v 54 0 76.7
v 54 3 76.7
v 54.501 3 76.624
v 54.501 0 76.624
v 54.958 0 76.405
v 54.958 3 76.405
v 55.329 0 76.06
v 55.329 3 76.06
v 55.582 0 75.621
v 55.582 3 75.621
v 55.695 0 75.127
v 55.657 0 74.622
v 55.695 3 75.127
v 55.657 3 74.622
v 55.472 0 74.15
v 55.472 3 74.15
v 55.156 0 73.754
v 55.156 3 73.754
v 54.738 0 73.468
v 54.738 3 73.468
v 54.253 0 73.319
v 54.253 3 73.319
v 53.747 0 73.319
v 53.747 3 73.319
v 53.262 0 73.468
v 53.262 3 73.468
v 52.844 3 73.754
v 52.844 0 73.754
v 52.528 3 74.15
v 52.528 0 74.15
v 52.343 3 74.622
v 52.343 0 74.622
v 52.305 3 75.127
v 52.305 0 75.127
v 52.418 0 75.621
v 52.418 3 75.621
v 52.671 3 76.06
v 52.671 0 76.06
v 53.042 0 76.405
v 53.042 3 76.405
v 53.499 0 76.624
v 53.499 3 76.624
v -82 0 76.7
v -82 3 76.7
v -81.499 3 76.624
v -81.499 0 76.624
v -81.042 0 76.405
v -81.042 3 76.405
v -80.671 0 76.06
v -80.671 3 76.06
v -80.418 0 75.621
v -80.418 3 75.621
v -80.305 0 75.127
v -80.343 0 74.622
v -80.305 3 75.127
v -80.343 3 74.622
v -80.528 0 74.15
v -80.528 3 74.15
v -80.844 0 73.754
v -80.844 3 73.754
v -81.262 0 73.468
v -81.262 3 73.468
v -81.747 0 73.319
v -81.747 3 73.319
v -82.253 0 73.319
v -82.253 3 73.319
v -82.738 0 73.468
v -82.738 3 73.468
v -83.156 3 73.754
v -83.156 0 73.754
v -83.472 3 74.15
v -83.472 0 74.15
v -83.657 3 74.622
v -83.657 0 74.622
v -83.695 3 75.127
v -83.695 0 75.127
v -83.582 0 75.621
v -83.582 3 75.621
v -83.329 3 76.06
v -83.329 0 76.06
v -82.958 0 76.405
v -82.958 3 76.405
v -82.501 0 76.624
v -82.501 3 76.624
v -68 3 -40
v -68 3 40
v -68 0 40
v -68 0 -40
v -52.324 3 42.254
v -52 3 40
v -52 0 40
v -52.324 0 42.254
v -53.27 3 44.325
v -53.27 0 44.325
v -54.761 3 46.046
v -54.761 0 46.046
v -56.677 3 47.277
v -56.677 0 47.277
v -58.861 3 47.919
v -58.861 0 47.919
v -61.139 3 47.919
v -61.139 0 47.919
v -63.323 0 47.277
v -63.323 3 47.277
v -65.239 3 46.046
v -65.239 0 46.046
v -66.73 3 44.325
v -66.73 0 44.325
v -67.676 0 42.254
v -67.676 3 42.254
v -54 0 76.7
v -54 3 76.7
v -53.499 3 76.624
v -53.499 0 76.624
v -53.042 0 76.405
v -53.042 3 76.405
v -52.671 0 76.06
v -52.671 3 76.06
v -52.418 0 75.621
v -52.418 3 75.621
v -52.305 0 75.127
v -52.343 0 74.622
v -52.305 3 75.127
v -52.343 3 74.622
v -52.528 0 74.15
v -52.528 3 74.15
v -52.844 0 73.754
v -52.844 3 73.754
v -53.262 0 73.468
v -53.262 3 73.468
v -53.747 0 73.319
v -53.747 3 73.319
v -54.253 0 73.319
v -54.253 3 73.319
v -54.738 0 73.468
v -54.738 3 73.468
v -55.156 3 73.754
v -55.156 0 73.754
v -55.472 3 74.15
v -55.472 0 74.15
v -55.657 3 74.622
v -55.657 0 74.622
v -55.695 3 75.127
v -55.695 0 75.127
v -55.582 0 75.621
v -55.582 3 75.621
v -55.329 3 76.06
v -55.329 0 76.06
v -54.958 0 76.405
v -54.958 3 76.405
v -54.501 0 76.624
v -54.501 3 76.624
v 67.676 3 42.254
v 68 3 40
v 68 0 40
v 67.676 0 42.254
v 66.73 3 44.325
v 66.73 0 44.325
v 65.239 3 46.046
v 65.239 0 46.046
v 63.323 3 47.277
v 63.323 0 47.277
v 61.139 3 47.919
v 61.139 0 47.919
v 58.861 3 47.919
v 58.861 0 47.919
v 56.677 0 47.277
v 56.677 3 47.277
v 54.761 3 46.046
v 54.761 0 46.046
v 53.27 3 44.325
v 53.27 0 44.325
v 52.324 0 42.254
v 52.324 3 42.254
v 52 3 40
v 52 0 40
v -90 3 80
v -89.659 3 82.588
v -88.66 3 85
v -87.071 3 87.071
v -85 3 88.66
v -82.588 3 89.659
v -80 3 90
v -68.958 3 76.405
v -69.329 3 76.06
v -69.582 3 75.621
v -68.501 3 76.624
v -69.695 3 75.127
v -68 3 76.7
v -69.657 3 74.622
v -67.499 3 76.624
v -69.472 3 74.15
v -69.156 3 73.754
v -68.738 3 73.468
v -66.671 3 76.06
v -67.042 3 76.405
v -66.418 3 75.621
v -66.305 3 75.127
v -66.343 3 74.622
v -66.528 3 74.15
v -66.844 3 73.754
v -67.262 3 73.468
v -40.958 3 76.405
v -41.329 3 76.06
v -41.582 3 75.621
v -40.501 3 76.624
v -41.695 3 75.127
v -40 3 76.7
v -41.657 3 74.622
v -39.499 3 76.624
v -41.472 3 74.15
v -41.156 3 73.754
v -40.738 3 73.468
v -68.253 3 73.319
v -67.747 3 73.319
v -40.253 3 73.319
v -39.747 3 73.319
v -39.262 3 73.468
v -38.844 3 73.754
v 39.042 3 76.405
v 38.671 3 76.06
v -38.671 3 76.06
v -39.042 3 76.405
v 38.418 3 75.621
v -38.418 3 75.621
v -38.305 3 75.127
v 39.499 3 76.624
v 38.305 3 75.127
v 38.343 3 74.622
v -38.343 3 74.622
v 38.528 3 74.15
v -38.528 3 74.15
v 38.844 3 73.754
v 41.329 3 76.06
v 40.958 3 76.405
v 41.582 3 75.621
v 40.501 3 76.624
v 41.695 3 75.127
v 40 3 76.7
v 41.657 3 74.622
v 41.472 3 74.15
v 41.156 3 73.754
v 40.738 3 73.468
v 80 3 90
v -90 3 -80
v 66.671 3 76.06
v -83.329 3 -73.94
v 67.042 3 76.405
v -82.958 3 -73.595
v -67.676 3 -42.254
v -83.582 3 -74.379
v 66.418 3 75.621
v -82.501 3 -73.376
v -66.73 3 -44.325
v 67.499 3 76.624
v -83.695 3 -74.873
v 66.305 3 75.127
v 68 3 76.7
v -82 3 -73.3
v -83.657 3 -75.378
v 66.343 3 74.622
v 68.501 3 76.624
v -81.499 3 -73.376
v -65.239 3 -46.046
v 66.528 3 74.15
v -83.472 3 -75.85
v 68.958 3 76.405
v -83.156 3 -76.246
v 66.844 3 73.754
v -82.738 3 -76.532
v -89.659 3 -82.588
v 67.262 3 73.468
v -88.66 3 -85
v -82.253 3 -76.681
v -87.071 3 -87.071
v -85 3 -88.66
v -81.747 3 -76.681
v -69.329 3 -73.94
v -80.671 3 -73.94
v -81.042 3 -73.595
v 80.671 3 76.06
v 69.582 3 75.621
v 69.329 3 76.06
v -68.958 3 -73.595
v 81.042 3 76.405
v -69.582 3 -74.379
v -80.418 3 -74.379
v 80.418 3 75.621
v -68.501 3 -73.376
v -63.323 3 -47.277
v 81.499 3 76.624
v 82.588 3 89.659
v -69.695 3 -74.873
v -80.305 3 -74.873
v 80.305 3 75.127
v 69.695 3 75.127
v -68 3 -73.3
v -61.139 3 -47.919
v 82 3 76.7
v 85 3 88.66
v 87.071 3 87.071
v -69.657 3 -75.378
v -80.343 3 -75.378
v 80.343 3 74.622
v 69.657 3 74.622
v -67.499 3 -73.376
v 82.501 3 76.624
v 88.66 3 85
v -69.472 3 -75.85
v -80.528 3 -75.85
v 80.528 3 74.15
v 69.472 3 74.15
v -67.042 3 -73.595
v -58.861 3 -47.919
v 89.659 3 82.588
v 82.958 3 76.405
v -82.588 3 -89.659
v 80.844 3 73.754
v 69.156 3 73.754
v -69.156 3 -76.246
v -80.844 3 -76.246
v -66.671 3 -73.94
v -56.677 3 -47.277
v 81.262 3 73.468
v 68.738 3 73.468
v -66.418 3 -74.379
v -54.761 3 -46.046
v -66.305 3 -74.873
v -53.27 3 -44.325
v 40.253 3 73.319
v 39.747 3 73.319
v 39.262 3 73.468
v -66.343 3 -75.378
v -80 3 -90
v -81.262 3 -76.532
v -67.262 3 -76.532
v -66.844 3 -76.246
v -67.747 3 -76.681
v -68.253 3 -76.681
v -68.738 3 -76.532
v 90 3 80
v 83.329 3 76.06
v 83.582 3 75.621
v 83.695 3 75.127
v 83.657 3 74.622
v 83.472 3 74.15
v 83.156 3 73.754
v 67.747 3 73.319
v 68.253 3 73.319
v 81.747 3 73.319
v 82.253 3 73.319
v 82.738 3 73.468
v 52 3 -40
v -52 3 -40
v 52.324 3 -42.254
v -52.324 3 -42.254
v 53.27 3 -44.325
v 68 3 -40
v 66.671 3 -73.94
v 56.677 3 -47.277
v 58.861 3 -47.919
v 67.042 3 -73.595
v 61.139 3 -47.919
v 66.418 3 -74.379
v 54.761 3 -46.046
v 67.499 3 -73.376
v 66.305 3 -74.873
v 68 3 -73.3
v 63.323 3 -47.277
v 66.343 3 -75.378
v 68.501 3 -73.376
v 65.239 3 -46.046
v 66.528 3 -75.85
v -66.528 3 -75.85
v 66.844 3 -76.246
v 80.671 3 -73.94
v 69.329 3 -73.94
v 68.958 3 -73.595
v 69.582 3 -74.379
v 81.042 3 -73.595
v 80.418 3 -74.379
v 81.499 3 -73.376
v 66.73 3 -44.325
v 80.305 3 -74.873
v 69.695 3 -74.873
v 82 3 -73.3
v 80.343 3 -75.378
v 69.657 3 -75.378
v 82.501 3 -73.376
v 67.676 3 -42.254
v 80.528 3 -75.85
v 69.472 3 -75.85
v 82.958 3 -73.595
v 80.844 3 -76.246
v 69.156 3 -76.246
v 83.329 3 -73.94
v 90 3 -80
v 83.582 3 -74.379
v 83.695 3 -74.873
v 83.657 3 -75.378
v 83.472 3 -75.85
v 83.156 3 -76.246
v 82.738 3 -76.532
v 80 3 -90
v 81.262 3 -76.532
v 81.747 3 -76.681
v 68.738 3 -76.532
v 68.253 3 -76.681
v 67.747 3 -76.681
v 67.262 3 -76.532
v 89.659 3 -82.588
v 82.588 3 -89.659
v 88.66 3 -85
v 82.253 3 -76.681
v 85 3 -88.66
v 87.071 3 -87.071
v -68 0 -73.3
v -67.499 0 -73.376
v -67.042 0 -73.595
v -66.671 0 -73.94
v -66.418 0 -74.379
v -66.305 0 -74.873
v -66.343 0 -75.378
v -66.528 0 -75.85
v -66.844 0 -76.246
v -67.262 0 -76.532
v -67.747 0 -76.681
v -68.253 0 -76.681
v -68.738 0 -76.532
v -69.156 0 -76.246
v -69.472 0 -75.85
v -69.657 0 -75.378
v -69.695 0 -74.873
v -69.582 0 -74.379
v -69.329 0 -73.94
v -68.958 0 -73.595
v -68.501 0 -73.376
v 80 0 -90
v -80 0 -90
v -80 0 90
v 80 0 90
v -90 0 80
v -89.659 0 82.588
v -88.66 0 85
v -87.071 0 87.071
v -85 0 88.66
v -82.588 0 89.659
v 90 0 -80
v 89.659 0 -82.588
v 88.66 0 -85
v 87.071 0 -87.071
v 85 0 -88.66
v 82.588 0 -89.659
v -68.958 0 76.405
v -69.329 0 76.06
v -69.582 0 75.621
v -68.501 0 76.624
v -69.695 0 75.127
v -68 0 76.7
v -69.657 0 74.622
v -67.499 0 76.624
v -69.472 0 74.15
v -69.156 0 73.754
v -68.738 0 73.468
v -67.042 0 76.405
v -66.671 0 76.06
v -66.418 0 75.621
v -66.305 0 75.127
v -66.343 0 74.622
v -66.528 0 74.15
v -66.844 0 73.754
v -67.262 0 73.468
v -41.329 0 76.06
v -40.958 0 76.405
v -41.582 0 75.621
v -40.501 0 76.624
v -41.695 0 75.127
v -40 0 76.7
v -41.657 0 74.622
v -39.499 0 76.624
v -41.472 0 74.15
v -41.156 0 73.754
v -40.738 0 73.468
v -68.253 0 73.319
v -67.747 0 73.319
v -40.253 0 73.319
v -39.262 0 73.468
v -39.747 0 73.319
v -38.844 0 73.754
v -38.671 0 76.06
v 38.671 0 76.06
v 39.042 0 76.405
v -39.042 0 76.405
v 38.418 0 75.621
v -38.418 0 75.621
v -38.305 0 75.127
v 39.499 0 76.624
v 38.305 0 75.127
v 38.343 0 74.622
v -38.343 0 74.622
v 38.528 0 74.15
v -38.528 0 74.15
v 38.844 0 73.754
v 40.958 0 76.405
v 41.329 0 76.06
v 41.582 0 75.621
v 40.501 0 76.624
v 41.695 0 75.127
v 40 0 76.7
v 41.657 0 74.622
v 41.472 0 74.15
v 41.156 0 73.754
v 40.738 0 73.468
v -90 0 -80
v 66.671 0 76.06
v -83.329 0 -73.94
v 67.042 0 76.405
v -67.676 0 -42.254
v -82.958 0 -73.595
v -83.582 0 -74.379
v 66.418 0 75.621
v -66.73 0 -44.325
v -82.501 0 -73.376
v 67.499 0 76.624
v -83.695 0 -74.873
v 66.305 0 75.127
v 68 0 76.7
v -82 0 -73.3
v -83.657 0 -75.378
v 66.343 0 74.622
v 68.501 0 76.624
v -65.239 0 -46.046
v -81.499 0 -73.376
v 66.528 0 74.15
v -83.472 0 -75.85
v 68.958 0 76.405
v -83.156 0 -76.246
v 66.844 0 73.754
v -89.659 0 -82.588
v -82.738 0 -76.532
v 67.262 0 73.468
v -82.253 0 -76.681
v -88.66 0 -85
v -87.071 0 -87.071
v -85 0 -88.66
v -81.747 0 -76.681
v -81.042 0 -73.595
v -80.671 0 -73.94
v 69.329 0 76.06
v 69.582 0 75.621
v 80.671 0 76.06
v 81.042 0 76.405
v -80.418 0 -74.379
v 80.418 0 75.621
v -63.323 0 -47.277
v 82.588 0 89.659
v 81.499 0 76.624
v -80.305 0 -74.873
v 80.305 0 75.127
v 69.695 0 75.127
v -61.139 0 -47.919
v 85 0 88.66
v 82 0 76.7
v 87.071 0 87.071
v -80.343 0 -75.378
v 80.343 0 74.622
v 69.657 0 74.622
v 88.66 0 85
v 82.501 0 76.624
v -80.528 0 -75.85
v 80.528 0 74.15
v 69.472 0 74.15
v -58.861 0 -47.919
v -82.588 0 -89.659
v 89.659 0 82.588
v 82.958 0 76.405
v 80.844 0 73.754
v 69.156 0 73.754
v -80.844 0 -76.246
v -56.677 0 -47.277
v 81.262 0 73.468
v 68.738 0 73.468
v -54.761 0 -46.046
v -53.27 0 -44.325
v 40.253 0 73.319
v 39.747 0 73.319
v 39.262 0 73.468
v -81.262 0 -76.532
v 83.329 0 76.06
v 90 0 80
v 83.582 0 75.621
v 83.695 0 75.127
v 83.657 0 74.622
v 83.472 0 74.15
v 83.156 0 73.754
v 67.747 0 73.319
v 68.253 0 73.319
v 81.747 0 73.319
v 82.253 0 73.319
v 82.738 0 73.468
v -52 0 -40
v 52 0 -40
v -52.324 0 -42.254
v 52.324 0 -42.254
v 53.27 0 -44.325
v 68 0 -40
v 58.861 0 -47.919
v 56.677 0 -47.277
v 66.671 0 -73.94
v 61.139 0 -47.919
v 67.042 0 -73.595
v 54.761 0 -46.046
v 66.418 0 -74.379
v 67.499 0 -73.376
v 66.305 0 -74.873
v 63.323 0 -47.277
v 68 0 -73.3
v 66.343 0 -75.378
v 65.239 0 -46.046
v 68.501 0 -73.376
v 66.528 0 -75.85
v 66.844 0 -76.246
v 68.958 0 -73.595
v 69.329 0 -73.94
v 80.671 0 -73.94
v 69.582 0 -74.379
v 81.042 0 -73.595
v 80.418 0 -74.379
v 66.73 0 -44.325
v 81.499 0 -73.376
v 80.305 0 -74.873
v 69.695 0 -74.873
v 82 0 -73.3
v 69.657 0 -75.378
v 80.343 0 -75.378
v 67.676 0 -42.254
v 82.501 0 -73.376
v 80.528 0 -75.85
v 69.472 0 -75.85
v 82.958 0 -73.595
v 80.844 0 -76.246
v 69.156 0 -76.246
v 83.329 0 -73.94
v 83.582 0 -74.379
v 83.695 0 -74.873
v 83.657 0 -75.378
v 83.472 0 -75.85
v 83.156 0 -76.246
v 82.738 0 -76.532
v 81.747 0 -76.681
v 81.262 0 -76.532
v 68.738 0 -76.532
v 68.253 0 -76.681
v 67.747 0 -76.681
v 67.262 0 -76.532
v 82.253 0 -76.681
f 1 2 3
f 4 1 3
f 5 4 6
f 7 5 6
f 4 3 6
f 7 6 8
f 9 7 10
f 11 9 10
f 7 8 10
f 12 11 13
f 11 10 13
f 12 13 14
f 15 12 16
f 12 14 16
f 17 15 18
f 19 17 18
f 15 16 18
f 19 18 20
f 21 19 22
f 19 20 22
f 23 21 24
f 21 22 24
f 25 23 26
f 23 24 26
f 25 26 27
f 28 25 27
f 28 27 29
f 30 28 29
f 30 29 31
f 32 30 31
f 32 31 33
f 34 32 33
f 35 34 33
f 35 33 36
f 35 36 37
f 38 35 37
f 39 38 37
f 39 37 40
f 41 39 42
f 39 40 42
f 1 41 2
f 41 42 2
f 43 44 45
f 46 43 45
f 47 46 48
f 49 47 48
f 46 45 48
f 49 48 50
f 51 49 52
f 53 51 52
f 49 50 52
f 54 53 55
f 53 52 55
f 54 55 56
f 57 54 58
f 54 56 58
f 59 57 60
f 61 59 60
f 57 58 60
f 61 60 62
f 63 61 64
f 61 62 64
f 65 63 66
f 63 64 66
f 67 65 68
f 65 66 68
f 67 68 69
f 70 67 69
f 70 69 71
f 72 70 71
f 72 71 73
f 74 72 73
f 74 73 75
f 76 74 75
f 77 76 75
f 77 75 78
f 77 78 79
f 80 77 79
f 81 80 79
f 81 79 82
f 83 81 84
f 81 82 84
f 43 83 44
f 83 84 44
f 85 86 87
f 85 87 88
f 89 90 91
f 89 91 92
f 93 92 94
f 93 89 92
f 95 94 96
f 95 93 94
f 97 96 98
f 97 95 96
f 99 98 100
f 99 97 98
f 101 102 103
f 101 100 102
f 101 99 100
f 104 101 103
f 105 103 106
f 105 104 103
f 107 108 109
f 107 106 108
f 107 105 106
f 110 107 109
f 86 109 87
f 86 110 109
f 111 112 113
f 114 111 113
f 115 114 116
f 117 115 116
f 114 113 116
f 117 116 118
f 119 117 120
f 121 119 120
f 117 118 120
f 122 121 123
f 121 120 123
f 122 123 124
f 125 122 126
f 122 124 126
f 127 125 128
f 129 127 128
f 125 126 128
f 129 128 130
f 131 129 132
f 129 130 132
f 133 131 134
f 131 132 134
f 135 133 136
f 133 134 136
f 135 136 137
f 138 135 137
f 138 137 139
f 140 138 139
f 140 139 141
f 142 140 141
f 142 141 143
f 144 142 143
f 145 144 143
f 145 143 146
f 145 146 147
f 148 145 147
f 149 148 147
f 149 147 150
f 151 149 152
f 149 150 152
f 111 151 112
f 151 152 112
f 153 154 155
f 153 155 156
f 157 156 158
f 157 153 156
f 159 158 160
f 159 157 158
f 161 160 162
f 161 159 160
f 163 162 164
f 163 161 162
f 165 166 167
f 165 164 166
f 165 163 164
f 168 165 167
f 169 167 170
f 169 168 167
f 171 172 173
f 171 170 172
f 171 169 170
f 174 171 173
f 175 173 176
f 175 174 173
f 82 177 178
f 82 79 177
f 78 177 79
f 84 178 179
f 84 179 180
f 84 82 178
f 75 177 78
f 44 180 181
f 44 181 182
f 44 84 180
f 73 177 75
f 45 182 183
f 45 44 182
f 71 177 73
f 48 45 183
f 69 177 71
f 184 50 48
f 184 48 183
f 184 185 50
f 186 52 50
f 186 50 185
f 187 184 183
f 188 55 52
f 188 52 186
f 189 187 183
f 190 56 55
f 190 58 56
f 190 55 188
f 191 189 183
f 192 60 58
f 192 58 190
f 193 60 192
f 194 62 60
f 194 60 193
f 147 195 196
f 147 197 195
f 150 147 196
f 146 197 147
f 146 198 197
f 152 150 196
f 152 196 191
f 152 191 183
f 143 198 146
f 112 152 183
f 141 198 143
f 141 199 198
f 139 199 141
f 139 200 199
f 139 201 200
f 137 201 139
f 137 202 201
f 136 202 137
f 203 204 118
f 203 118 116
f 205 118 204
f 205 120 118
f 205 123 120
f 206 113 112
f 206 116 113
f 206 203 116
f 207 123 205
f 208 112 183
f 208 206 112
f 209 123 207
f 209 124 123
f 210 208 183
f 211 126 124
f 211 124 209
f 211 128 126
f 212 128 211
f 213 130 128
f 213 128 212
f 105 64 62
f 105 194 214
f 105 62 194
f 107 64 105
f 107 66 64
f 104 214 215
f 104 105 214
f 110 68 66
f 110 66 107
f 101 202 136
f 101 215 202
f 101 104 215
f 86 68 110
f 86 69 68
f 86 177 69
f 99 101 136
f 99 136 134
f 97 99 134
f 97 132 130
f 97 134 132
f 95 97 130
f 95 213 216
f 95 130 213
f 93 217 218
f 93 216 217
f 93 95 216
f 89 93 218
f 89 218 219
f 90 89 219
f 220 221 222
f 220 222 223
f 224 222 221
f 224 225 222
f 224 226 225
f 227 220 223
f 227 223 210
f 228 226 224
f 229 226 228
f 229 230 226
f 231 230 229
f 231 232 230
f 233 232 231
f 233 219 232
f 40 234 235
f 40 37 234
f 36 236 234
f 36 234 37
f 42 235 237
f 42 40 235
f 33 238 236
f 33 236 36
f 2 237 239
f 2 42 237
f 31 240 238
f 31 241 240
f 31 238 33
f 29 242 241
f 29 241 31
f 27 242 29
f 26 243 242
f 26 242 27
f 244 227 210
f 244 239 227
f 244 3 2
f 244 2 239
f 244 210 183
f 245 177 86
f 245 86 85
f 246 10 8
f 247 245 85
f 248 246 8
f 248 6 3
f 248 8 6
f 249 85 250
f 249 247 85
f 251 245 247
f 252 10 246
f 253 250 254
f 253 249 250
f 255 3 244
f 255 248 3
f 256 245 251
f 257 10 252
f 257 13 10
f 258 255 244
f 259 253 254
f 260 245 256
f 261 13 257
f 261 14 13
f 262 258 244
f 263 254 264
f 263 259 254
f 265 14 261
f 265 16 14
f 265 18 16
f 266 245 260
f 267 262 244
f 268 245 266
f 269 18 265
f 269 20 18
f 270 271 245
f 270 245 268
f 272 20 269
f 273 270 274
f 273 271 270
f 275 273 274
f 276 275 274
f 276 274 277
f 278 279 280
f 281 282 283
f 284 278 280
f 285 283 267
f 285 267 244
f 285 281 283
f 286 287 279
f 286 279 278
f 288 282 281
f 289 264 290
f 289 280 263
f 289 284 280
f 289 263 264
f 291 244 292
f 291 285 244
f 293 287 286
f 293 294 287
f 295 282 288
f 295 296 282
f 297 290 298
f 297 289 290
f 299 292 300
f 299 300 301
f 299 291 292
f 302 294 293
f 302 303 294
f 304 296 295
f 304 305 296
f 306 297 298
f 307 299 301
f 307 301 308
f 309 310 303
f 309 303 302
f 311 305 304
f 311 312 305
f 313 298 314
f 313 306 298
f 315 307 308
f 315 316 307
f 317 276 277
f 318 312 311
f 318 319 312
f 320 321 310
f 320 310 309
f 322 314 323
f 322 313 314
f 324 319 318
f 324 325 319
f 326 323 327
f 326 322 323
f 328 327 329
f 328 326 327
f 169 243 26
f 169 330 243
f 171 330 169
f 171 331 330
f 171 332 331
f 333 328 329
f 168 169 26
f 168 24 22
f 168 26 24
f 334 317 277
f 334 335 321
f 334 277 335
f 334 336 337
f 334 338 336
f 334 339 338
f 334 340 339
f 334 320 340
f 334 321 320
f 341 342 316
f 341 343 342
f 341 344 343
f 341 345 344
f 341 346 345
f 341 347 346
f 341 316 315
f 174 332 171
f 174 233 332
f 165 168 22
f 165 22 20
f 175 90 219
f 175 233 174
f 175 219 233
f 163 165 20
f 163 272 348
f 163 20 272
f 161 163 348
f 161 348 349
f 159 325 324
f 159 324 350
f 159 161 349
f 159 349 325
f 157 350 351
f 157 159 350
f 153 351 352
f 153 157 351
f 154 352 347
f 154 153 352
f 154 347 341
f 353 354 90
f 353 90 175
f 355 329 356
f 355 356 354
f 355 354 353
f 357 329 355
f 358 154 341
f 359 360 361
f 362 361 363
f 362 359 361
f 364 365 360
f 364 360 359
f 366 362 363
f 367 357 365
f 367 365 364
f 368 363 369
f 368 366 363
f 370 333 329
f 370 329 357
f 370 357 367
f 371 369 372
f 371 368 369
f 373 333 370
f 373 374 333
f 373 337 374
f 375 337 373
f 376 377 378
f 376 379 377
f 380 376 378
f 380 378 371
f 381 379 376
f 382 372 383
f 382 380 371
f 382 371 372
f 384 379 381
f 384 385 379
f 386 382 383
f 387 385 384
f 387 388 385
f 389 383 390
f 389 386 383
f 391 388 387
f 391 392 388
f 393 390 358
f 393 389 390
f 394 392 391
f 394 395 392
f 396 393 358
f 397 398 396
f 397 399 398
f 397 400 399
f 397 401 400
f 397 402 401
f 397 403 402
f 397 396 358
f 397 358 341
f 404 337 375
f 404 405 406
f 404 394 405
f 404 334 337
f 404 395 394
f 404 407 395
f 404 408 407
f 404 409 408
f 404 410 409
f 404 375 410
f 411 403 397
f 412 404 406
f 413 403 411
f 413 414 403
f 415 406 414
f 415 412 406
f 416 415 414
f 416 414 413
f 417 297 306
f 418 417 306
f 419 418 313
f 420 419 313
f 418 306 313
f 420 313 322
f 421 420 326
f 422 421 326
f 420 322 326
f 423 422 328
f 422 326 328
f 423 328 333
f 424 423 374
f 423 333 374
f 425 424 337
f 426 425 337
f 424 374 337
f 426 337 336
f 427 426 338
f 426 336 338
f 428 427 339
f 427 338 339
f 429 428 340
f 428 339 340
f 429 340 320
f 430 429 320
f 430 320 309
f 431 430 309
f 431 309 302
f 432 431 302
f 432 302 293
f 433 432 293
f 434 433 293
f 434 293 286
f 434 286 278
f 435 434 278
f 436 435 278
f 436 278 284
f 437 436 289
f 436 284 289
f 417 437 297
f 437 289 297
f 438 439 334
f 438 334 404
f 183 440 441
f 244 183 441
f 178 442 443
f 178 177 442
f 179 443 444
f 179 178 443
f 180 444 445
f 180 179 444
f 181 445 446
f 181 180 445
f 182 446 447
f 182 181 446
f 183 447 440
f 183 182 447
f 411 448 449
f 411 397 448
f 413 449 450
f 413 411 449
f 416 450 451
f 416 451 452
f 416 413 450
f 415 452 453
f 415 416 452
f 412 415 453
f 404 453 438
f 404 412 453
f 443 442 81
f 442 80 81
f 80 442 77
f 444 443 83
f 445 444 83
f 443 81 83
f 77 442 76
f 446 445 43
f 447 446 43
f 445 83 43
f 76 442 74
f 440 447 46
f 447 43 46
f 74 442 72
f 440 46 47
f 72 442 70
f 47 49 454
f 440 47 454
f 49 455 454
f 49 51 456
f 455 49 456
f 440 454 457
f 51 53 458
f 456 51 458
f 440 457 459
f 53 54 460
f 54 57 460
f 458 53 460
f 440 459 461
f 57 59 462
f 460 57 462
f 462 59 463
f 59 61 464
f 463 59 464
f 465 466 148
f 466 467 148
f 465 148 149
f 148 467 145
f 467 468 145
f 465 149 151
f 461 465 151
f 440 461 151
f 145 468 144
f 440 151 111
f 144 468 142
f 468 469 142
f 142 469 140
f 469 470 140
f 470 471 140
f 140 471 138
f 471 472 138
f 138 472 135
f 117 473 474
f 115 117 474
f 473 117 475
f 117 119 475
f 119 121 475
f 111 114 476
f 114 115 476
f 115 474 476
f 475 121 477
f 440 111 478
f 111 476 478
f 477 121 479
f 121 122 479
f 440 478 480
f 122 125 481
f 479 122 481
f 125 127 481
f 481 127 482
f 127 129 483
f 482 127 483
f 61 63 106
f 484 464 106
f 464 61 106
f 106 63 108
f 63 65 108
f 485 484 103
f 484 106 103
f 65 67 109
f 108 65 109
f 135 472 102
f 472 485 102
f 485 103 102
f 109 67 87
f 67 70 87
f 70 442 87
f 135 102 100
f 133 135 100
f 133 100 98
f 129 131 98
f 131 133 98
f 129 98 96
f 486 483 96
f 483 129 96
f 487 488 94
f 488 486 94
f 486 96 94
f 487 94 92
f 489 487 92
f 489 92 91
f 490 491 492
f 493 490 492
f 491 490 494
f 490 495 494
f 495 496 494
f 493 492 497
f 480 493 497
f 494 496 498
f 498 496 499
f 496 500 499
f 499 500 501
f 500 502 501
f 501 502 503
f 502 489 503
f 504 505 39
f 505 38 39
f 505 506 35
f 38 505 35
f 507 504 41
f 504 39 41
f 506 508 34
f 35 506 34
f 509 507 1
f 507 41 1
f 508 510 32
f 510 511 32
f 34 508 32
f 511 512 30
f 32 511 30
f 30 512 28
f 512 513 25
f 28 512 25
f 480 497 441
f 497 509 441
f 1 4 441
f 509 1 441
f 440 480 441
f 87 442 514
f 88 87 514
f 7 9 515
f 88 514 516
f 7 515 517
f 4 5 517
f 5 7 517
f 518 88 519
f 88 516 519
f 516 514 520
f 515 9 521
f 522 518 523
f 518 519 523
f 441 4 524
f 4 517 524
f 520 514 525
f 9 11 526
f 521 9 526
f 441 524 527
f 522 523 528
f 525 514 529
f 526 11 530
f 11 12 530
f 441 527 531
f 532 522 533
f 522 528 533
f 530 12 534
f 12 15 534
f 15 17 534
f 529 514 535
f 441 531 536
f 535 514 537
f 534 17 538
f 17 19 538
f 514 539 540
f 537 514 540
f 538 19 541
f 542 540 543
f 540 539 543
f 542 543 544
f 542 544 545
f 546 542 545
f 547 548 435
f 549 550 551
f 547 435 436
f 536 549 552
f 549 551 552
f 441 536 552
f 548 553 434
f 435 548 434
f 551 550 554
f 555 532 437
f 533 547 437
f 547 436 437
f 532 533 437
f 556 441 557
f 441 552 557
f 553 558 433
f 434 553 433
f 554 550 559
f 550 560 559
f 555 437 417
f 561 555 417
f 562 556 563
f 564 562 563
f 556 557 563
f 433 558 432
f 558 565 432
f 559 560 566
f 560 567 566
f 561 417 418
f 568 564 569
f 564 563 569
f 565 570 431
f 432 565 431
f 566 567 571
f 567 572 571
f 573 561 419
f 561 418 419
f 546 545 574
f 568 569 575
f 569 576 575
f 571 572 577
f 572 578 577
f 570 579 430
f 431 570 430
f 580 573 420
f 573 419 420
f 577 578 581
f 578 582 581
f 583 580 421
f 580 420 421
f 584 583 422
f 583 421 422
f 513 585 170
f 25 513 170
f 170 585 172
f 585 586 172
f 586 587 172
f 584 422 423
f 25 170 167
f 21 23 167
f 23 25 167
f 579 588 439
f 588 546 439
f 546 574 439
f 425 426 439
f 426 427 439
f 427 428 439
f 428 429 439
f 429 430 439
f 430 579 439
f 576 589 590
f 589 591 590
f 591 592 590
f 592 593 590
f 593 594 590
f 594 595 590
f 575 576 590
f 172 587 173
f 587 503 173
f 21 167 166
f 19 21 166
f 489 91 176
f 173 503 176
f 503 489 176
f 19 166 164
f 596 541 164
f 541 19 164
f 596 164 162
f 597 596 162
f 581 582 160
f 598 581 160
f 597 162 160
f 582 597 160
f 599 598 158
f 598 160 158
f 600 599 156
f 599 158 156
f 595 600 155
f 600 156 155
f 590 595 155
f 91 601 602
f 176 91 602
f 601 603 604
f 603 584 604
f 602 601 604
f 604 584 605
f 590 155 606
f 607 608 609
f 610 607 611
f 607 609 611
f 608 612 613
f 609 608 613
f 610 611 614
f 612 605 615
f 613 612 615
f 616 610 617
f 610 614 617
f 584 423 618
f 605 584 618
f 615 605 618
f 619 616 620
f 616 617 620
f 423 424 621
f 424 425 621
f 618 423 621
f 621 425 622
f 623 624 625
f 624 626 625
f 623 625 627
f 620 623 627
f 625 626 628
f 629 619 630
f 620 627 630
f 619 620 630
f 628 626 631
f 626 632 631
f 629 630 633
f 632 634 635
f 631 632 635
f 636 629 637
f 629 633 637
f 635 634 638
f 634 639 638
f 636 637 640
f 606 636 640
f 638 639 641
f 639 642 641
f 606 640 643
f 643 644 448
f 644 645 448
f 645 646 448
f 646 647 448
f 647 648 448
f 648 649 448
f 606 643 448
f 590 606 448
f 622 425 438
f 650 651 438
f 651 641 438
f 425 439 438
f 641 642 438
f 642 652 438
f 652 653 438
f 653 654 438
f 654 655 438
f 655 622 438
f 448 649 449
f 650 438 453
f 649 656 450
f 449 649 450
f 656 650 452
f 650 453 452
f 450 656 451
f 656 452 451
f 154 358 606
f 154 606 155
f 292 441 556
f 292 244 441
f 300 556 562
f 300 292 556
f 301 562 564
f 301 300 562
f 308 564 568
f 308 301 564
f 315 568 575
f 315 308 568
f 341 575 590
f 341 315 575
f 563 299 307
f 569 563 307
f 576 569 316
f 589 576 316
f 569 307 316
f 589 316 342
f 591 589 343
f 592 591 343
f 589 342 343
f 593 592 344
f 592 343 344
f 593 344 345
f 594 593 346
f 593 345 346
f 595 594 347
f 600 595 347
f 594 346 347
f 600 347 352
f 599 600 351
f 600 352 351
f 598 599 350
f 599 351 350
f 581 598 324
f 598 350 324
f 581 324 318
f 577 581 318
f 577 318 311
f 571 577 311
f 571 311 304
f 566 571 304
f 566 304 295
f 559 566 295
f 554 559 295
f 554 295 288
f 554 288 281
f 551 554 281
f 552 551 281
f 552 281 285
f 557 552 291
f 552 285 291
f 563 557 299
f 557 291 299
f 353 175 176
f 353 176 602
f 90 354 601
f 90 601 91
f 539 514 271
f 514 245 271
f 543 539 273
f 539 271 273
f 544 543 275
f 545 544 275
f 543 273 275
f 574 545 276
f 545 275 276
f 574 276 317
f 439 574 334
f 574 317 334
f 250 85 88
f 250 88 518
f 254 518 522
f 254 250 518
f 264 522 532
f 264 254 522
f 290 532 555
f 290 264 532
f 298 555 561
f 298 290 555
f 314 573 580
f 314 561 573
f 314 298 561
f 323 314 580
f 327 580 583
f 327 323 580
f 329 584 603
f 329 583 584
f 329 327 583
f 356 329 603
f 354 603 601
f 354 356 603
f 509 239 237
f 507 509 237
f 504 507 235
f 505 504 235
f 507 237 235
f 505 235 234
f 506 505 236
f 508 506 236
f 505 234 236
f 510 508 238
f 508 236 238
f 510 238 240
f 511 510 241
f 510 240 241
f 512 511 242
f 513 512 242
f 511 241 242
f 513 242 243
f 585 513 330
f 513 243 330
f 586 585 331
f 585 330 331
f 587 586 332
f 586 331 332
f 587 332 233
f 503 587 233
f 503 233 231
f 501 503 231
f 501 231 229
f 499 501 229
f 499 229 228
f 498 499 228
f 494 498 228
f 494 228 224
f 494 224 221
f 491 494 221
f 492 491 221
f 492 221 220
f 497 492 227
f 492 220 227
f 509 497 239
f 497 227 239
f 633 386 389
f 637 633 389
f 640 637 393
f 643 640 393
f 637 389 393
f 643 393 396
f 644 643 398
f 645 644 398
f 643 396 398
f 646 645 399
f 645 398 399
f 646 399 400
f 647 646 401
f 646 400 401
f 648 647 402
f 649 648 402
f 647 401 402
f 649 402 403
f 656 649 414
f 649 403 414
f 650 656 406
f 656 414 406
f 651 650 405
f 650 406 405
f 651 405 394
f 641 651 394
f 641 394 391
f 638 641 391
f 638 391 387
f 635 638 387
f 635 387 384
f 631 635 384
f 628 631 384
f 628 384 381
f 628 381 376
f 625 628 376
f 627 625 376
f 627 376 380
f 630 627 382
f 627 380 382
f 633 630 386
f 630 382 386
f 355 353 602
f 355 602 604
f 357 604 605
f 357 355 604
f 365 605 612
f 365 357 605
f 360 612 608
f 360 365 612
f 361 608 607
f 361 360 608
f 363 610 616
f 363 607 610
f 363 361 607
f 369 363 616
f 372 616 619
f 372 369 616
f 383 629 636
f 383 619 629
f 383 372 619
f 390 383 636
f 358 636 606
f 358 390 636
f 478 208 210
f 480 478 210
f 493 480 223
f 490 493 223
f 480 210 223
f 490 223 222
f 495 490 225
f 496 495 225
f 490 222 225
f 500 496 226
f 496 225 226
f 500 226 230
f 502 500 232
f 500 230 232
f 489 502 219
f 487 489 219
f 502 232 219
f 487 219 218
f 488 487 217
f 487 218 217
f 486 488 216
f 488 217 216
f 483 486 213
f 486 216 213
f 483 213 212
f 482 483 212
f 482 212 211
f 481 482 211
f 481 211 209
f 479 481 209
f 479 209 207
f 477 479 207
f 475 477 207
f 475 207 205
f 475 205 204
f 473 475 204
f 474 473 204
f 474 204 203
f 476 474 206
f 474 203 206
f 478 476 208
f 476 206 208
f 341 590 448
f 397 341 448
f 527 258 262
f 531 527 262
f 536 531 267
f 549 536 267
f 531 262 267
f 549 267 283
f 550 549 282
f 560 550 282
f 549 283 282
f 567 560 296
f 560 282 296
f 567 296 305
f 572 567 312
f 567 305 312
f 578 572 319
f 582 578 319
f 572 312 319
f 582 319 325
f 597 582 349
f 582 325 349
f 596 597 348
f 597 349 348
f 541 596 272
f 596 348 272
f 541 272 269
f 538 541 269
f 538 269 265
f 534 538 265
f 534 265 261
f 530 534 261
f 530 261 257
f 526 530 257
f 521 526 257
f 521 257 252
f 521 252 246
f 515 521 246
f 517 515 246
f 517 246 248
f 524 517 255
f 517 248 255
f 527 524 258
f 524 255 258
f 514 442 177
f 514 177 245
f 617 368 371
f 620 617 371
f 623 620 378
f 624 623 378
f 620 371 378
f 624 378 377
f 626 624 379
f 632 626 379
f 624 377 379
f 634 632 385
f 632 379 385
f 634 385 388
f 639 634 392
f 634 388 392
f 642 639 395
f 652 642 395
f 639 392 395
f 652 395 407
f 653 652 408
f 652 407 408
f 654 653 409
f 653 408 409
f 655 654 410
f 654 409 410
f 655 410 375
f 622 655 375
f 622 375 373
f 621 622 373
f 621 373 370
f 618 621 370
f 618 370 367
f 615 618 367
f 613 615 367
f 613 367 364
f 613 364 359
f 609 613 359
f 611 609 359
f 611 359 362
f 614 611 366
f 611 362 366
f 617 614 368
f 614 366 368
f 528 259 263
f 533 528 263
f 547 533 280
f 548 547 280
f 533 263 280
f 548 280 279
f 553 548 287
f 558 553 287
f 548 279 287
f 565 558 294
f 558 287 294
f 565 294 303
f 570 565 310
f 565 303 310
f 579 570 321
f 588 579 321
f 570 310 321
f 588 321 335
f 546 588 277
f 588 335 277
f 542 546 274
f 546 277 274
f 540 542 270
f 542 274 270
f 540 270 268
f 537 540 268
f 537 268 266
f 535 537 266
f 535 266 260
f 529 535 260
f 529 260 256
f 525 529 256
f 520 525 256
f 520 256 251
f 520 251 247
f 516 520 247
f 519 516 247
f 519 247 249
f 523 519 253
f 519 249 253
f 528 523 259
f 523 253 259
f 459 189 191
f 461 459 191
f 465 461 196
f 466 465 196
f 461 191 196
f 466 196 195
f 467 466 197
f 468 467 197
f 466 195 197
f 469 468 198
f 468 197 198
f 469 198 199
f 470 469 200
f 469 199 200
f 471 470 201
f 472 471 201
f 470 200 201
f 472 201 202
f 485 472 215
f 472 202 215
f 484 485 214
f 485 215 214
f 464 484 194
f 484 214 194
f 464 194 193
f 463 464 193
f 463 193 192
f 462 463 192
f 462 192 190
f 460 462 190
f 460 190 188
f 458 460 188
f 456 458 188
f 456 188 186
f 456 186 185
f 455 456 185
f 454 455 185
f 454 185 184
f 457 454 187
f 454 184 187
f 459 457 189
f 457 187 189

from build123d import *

# Parameters (mm, degrees)
SKETCH1_W           = 180
SKETCH1_H           = 180
BOSS_EXTRUDE1_DEPTH = 3
FILLET1_R           = 10
SKETCH2_R           = 1.7
CUT_EXTRUDE1_DEPTH  = 3
CUT_EXTRUDE2_DEPTH  = 128.314571044


with BuildPart() as part:
    # Sketch1 → Boss-Extrude1 (new body)
    with BuildSketch(Plane(origin=(0, 0, 0), x_dir=(1, 0, 0), z_dir=(0, 1, 0))):
        Rectangle(SKETCH1_W, SKETCH1_H)
    extrude(amount=BOSS_EXTRUDE1_DEPTH)

    # Fillet1
    fillet1_edges = [part.edges().sort_by_distance(p)[0] for p in [
        (90, 1.5, 90),
        (-90, 1.5, 90),
        (-90, 1.5, -90),
        (90, 1.5, -90),
    ]]
    fillet(fillet1_edges, radius=FILLET1_R)

    # Sketch2 → Cut-Extrude1 (cut)
    with BuildSketch(Plane(origin=(0, 3, 0), x_dir=(1, 0, 0), z_dir=(0, 1, 0))):
        with Locations(Location((-82, 75, 0), (0, 0, 270))):
            Circle(SKETCH2_R)
        with Locations(Location((-68, 75, 0), (0, 0, 270))):
            Circle(SKETCH2_R)
        with Locations(Location((68, 75, 0), (0, 0, 270))):
            Circle(SKETCH2_R)
        with Locations(Location((82, 75, 0), (0, 0, 270))):
            Circle(SKETCH2_R)
        with Locations(Location((-82, -75, 0), (0, 0, 270))):
            Circle(SKETCH2_R)
        with Locations(Location((-68, -75, 0), (0, 0, 270))):
            Circle(SKETCH2_R)
        with Locations(Location((68, -75, 0), (0, 0, 270))):
            Circle(SKETCH2_R)
        with Locations(Location((82, -75, 0), (0, 0, 270))):
            Circle(SKETCH2_R)
        with Locations(Location((-54, -75, 0), (0, 0, 270))):
            Circle(SKETCH2_R)
        with Locations(Location((54, -75, 0), (0, 0, 270))):
            Circle(SKETCH2_R)
        with Locations(Location((-40, -75, 0), (0, 0, 270))):
            Circle(SKETCH2_R)
        with Locations(Location((40, -75, 0), (0, 0, 270))):
            Circle(SKETCH2_R)
    extrude(amount=-CUT_EXTRUDE1_DEPTH, mode=Mode.SUBTRACT)

    # Sketch3 → Cut-Extrude2 (cut, through all)
    with BuildSketch(Plane(origin=(0, 3, 0), x_dir=(1, 0, 0), z_dir=(0, 1, 0))):
        with BuildLine():
            Line((-52, 40), (-52, -40))
            ThreePointArc((-52, -40), (-60, -48), (-68, -40))
            Line((-68, -40), (-68, 40))
            ThreePointArc((-68, 40), (-60, 48), (-52, 40))
        make_face()
        with BuildLine():
            Line((68, 40), (68, -40))
            ThreePointArc((68, -40), (60, -48), (52, -40))
            Line((52, -40), (52, 40))
            ThreePointArc((52, 40), (60, 48), (68, 40))
        make_face()
    extrude(amount=-CUT_EXTRUDE2_DEPTH, mode=Mode.SUBTRACT)


solid = part.part
